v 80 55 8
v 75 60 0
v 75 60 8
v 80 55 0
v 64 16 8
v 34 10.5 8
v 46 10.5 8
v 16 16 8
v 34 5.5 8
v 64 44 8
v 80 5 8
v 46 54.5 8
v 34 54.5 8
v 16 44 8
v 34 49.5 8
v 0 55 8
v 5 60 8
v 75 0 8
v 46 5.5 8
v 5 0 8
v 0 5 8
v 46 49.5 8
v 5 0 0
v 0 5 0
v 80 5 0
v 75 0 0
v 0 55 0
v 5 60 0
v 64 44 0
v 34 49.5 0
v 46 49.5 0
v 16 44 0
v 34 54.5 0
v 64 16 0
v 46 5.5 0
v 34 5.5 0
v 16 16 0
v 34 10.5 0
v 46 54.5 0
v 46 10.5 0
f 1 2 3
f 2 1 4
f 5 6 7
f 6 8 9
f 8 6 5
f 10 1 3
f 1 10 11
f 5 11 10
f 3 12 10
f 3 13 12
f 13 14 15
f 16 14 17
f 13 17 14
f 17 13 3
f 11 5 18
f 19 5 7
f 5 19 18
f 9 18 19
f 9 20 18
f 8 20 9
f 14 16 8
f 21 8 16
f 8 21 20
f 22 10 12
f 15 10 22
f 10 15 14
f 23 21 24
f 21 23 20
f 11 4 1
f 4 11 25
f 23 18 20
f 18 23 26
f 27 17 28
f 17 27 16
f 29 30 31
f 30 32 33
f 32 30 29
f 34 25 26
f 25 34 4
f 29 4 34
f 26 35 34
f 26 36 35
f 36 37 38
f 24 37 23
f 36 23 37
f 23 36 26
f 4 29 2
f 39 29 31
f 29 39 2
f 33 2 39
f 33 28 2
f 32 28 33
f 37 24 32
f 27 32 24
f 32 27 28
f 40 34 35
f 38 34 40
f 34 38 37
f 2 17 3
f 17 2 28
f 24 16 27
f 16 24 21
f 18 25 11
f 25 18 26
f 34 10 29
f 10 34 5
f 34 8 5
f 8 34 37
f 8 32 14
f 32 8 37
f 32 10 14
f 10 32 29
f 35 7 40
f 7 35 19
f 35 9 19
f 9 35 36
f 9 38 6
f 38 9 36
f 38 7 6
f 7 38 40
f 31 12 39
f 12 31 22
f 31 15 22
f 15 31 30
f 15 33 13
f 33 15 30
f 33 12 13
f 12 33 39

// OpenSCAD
$fn = 32;

// ----------------------------------------------------------------------
// Frame plate: 80 x 60 frame, 16 mm rails
// ----------------------------------------------------------------------

// --- parameters (mm) ---
plate_l = 80;             // plate length, X
plate_w = 60;             // plate width, Y
plate_t = 8;              // plate thickness, Z (extrusion height)
corner_c = 5;             // corner chamfer
frame_bar = 16;           // frame rail width
slot_l = 12;              // adjustment slot length
slot_w = 5;               // adjustment slot width
fit_tol = 0.1;            // declared fit tolerance (prompt contract)
free_tol = 0.5;           // declared free tolerance (prompt contract)

win_l = plate_l - 2 * frame_bar;  // window length
win_w = plate_w - 2 * frame_bar;  // window width

profile = [[5, 0], [75, 0], [80, 5], [80, 55], [75, 60], [5, 60], [0, 55], [0, 5]];  // primary outline, 8 points, counter clockwise
void_1 = [[16, 16], [64, 16], [64, 44], [16, 44]];  // the window, 4 points
void_2 = [[34, 5.5], [46, 5.5], [46, 10.5], [34, 10.5]];  // adjustment slot, 4 points
void_3 = [[34, 49.5], [46, 49.5], [46, 54.5], [34, 54.5]];  // adjustment slot, 4 points

// --- the one profile operation ---
difference() {
  linear_extrude(height = plate_t) polygon(points = profile);
  translate([0, 0, -1])
    linear_extrude(height = plate_t + 2) polygon(points = void_1);
  translate([0, 0, -1])
    linear_extrude(height = plate_t + 2) polygon(points = void_2);
  translate([0, 0, -1])
    linear_extrude(height = plate_t + 2) polygon(points = void_3);
}
